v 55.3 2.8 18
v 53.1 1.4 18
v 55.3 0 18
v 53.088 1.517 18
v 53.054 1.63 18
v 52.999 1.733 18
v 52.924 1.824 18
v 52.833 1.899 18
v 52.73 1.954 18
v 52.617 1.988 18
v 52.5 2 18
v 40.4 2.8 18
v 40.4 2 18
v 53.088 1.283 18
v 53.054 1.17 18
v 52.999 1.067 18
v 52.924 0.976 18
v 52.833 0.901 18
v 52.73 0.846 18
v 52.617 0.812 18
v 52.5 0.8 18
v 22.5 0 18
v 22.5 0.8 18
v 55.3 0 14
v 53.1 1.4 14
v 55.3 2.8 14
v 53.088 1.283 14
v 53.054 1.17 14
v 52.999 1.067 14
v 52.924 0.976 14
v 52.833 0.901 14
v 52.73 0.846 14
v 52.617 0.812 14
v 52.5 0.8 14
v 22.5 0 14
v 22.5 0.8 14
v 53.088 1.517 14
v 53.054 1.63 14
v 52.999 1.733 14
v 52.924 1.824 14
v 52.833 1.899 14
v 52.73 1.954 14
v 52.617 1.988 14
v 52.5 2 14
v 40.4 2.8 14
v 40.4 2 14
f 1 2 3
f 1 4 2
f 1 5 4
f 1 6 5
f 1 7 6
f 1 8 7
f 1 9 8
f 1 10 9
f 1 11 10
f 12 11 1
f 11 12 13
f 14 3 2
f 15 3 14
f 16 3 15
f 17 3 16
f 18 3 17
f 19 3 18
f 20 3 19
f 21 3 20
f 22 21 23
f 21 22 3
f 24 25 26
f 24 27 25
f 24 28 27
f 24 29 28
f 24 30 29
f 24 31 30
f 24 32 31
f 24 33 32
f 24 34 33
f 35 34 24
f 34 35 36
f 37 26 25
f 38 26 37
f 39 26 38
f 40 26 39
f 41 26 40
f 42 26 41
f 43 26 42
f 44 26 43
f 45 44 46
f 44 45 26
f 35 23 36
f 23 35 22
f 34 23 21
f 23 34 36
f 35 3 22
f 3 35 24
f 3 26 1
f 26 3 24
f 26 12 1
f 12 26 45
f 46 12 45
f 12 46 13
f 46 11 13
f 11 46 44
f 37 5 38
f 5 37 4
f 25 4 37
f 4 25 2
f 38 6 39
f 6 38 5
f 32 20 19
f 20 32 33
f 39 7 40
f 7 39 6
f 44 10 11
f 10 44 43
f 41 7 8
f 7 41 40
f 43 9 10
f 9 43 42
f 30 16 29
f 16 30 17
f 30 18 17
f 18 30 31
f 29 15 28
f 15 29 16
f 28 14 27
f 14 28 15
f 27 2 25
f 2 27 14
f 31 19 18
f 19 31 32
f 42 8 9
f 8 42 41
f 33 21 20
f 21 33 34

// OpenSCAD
//////////////////////////////////////////////////////////////////////////////////////
///
///  FLEXBATTER: Flexing battery holder with built-in spring
///
///  This file generates battery holders for arbitrary cylindrical sizes.
///  The number of batteries and their size is fully parametrized.
///
///  The usual metallic spring at the minus pole is replaced by a
///  flexible printed spring, which is pressing the contacts firmly to 
///  the battery.
///
///  The contacts for the plus and minus pole can easily be made by
///  a few windings of the uninsulated ends of the connecting wires.
///  Each battery compartment contains are several holes to the outside
///  as well ad to the neighboring compartments, through which connecting
///  wires can be passed for easy configuring of parallel, serial or
///  balanced-serial battery packs.
///  
///  The preconfigured battery sizes are:
///  AA, AAA, C, D, 18650(Li-Ion), 18650P(protected Li-Ion), CR123A(16340)
///  
///  Given that the printed plastic spring needs to be flexible, ABS is the material
///  of choice here.
///
//////////////////////////////////////////////////////////////////////////////////////
///
///  2014-09-09 Heinz Spiess, Switzerland
///
///  released under Creative Commons - Attribution - Share Alike licence (CC BY-SA)
//////////////////////////////////////////////////////////////////////////////////////

// build a cube with chamfered edges
module chamfered_cube(size,d=1){
   hull(){
     translate([d,d,0])cube(size-2*[d,d,0]);
     translate([0,d,d])cube(size-2*[0,d,d]);
     translate([d,0,d])cube(size-2*[d,0,d]);
   }
}


// draw an arc width height h between radius r1..r2 and angles a1..a2
module arc(r1,r2,h,a1=0,a2=0){
     if(a2-a1<=180){
        difference(){
           cylinder(r=r2,h=h);
           translate([0,0,-1])cylinder(r=r1,h=h+2);
	   rotate(a2)translate([-r1-r2,0,-1])cube([2*(r1+r2),2*(r1+r2),h+2]);
	   rotate(a1+180)translate([-r1-r2,0,-1])cube([2*(r1+r2),2*(r1+r2),h+2]);
        }
     } else {
           difference(){
              cylinder(r=r2,h=h);
              translate([0,0,-1])cylinder(r=r1,h=h+2);
              intersection(){
	       rotate(a2)translate([-r1-r2,0,-1])cube([2*(r1+r2),2*(r1+r2),h+2]);
	       rotate(a1+180)translate([-r1-r2,0,-1])cube([2*(r1+r2),2*(r1+r2),h+2]);
	      }
           }
     }
}

/////////////////////////////////////////////////////////////////////////////////
// sline - generate a "snake line" of width w and height h 
// with a arbitrary sequence of segments defined by a radius and a turning angle
//
//   angle[i] > 0  left turn / counter-clockwise
//   angle[i] < 0  left turn / clockwise
//   angle[i] = 0  straight segment with length radius[i]
//
/////////////////////////////////////////////////////////////////////////////////
// Heinz Spiess, 2014-09-06 (CC BY-SA)
/////////////////////////////////////////////////////////////////////////////////
module sline(angle,radius,i,w,h){
   scale([angle[i]>=0?1:-1,1,1])
      assign(r=abs(radius[i]))assign(a=angle[i])
         translate([a?r:0,0,0]){
	    translate([-w/2,-r-0.01,0])cube([w,0.02,h]); // tiny overlap!
            if(a)arc(r-w/2,r+w/2,0,a,h=h);
	    else if(r>0)translate([-w/2,-r,0])cube([w,r,h]);
      if(i+1<len(angle))
           rotate(angle[i])
	      translate([a?-r:0,a?0:-r,0])
	         sline(angle,radius,i+1,w,h);
  }
}

//////////////////////////////////////////////////////////////////////////////////
//
//  FLEXBATTER:  Flexing battery holder with integrated plastic spring
//
//////////////////////////////////////////////////////////////////////////////////
module flexbatter(n=1,l=65,d=18,hf=0.75,r=4,shd=3,eps=0.28,el=0,xchan=[1/4,3/4],$fn=24){
ew=0.56;   // extrusion width
eh=0.25;   // extrusion height
w = 4*ew;  // case wall thickness
ws = 2*ew; // spring wall thickness
ch = w-ws; // edge chamfering
deepen=0; //deepening for side grip of batteries
//el = 0;  // extra length in spring
//eps = 0.28;
//shd = 3; // screw hole diameter
//hf=0.75;
//xchan=[1/4,3/4]; // relative position of traversal wire channels

r = d/5+2*ws; // linear spring length (depends on sline() call!)

   for(i=[0:n-1])translate([0,i*(d+w+ws),0]){ // generate n battery cases
      difference(){
         
         union(){
            difference(){
               // main body
               translate([0,-w-d/2,0])
	          chamfered_cube([l+w,d+2*w+(i<n-1?ws:0),hf*d+w+ch],ch);
	       // main cavity
               translate([-2,-d/2,w])cube([2+l,d,d+1]);
	       // cavity for locating plastic spring
               translate([-1,-d/2,-1])cube([2,d,d+w+2]);
	       // small cylindrical carving of walls and bottom
	       if(eps>0)translate([-1,0,d/2+w])rotate([0,90,0])cylinder(r=d/2+eps,h=l+1);
            }
      
            // plastic spring for minus pole
            for(sy=[-1,1])scale([1,sy,1])assign(D=d+2*w-2*ws-0.7){
               translate([ch,d/2+w-ws/2,0])rotate(-90)
		  //sline([90,0,120,90,120,90,0],[d/8+2,d/6,d/8-1,d/8,-d/8,d/8,d/2],0,ws,hf*d+w);
		  sline([0,180,0,180,0,-180,0,90,0],[r+ch+el,D/4,el,D/12,el/2,D/12,1+el/2,D/5,D/3],0,ws,hf*d+w);


            }
         }
      
         // lower and upper holes for contacts
         for(z=[-2*ws,2*ws])
            translate([-2*ws,-w,w-ws/2+d/2+z])cube([l+2*w+2,2*w,ws]);
      
         // longitudinal bottom wire channel
         translate([-2*ws,0,0])rotate([0,90,0])cylinder(r=w/2,h=l+w+2+r,$fn=5);
      
         // traversal bottom wire channels
         for(x=l*xchan)translate([x,-d/2-w-1,eh]) rotate([-90,0,0])cylinder(r=w/2,h=d+2*w+ws+2,$fn=6);
   
         // grip deepening
	 if(deepen>0)
            translate([w+l/2-0.5,-d/2-w-0.01,w+d+l])
	       rotate([-90,0,0]){
	          cylinder(r=l+deepen*d,h=d+2*w+2*ws+2,$fn=72);
	          if(i==0)cylinder(r1=l+deepen*d+ch,r2=l+deepen*d,h=ch+0.02,$fn=72);
	          if(i==n-1)translate([0,0,d+2*w-ch])cylinder(r2=l+deepen*d+ch,r1=l+deepen*d,h=ch+0.02,$fn=72);

               }
         // conical screw holes in corners
         for(x=[7+shd,l-2*shd])for(y=[-d/2+shd,d/2-shd])
             translate([x,y,-1]){
                cylinder(r=shd/2,h=w+2);
                translate([0,0,w-shd/2+1])cylinder(r1=shd/2,r2=shd,h=shd/2+0.01);
             }

         // holes for wires passing inside
         for(sy=[-1,1])scale([1,sy,1]){
	    translate([l-1,-d/2,w])cube([w+2,2,2]);
            for(x=[3,l-7])translate([x,-d/2-w-ws-1,w])cube([3,w+ws+3,2]); 
            translate([3,-d/2+w/2-0.75,-1])cube([3,1.5,w+2]); 
            translate([-0.5,-d/2+w/2,0])rotate([0,90,0])cylinder(r=w/2,h=6.5,$fn=5);
         }

         // engrave battery symbol
	 translate([w+l/2,d/4+1,w])cube([l/5,d/4.5,4*eh],true);
	 translate([w+l/2+l/10,d/4+1,w])cube([d/7,d/10,4*eh],true);
	 // engrave plus symbol
	 assign(sy=(l>12*shd)?1:-1){ // for short batteries +- on the side
	    translate([w+l/2+l/(sy>0?5:10),sy*(d/4+1),w]){
	       cube([1,d/4,4*eh],true);
	       cube([d/4,1,4*eh],true);
            }
	 // engrave minus symbol
	    translate([w+l/2-l/(sy>0?5:10),sy*(d/4+1),w])
	       cube([1,d/4,4*eh],true);
         }
   
         //correction for middle separators
         //if(i<n-1) translate([-d,d/2+w-ws/2,-1])cube([d,ws/2+0.1,d+2]);
	 //else translate([1,d/2+w,-0.01])cylinder(r1=ch,r2=0,h=ch);
         //if(i>0) translate([-d,-d/2-w-0.1,-1])cube([d,ws/2+0.1,d+2]);
	 //else translate([1,-d/2-w,-0.01])cylinder(r1=ch,r2=0,h=ch);


      }


      // horizontal contact bulges (+ and - pole)
      for(x=[-0.3,l])
         hull()for(y=[-3+el,3-el])
            translate([x,y,w+d/2])sphere(r=ws);
   
      // vertical contact bulge (+ pole only)
      if(0)hull()for(z=[-3+el,3-el])for(x=[0,w-ws])
            translate([l+x,0,w+d/2+z])sphere(r=ws);



   }

}

module flexbatter18650(n=1){
   flexbatter(n=n,l=65.5,d=18.4,hf=0.75,shd=3,eps=0.28);
}  

module flexbatter18650P(n=1){
   flexbatter(n=n,l=67.5,d=18.4,hf=0.75,shd=3,eps=0.28);
}  

module flexbatterCR123A(n=1){
   flexbatter(n=n,l=35.1,d=16.7,hf=0.75,shd=3,xchan=[0.5],eps=0.28);
}  

module flexbatterD(n=1){
   flexbatter(n=n,l=61.5,d=34.0,hf=0.75,shd=3,eps=0.28);
}  

module flexbatterC(n=1){
   flexbatter(n=n,l=51.6,d=26.4,hf=0.75,shd=3,eps=0.28);
}  

module flexbatterAA(n=1){
   flexbatter(n=n,l=51.6,d=14.4,hf=0.80,shd=2.5,el=0.5,eps=0.28);
}  

module flexbatterAAA(n=1){
   flexbatter(n=n,l=46.1,d=10.45,hf=0.84,shd=2,el=1,xchan=[0.5],eps=0);
}  

module flexbatter18650x1(){ // AUTO_MAKE_STL
  flexbatter18650(n=1);
}

module flexbatter18650Px1(){ // AUTO_MAKE_STL
  flexbatter18650P(n=1);
}

module flexbatterCR123Ax1(){ // AUTO_MAKE_STL
  flexbatterCR123A(n=1);
}

module flexbatterAAx1(){ // AUTO_MAKE_STL
  flexbatterAA(n=1);
}

module flexbatterAAAx1(){ // AUTO_MAKE_STL
  flexbatterAAA(n=1);
}

module flexbatterCx1(){ // AUTO_MAKE_STL
  flexbatterC(n=1);
}

module flexbatter18650x2(){ // AUTO_MAKE_STL
  flexbatter18650(n=2);
}

module flexbatterAAx2(){ // AUTO_MAKE_STL
  flexbatterAA(n=2);
}

module flexbatterAAAx2(){ // AUTO_MAKE_STL
  flexbatterAAA(n=2);
}

module flexbatterCx2(){ // AUTO_MAKE_STL
  flexbatterC(n=2);
}

module flexbatter18650x3(){ // AUTO_MAKE_STL
  flexbatter18650(n=3);
}

module flexbatterAAx3(){ // AUTO_MAKE_STL
  flexbatterAA(n=3);
}

module flexbatterAAAx3(){ // AUTO_MAKE_STL
  flexbatterAAA(n=3);
}

module flexbatter18650x4(){ // AUTO_MAKE_STL
  flexbatter18650(n=4);
}

module flexbatterAAx4(){ // AUTO_MAKE_STL
  flexbatterAA(n=4);
}

module flexbatterAAAx4(){ // AUTO_MAKE_STL
  flexbatterAAA(n=4);
}

module rackhook(){
  raillen=75;
  railh=14;
  railth=0.8;
  pegw=11;
  pegth=1.1;
  flapw=30;
  flaph=4;
  flapth=railth;
  hookth=flapth;
  hookw=pegw*1.1;
  hookgap=pegth+0.1;
  spineth=flapth+hookgap+hookth;
  difference(){
  union(){
	//rail
  //cube([raillen,railth,railh]);
  //outer plate
  translate([(raillen/2-flapw/2),0,railh]) cube([flapw,flapth,flaph]);
  //spine of hook 
  translate([(raillen/2+flapw/2),0,railh]) cube([spineth,spineth,flaph]);
  //hook
  translate([(raillen/2-flapw/2)+flapw-hookw,flapth+hookgap,railh]) cube([pegw*1.1,flapth,flaph]);
  }//union
 //rounder of spine
  translate([(raillen/2+flapw/2),railth+hookgap/2,railh-0.05]) cylinder(d=hookgap,h=flaph+0.1,$fn=32);
  }//difference
}

rackhook();

// uncomment as needed:

//flexbatterCR123A(n=2);
//rotate([0,0,0])translate([0,0,-9])flexbatter18650(n=1);
//translate([0,40,0])rotate([90,0,0])translate([0,0,-9])flexbatter18650(n=1);
//translate([0,80,0])rotate([180,0,0])translate([0,0,-9])flexbatter18650(n=1);
//translate([0,120,0])rotate([-90,0,0])translate([0,0,-9])flexbatter18650(n=1);
//translate([0,33,0])flexbatter18650(n=2);
//translate([0,90,0])flexbatter18650(n=3);
//translate([-90,33,0])flexbatter18650(n=4);
//translate([0,28,0])flexbatterAA(n=2);
//translate([0,50,0])flexbatterAAA(n=1);
//flexbatterC(n=1);
//flexbatterD(n=1);
